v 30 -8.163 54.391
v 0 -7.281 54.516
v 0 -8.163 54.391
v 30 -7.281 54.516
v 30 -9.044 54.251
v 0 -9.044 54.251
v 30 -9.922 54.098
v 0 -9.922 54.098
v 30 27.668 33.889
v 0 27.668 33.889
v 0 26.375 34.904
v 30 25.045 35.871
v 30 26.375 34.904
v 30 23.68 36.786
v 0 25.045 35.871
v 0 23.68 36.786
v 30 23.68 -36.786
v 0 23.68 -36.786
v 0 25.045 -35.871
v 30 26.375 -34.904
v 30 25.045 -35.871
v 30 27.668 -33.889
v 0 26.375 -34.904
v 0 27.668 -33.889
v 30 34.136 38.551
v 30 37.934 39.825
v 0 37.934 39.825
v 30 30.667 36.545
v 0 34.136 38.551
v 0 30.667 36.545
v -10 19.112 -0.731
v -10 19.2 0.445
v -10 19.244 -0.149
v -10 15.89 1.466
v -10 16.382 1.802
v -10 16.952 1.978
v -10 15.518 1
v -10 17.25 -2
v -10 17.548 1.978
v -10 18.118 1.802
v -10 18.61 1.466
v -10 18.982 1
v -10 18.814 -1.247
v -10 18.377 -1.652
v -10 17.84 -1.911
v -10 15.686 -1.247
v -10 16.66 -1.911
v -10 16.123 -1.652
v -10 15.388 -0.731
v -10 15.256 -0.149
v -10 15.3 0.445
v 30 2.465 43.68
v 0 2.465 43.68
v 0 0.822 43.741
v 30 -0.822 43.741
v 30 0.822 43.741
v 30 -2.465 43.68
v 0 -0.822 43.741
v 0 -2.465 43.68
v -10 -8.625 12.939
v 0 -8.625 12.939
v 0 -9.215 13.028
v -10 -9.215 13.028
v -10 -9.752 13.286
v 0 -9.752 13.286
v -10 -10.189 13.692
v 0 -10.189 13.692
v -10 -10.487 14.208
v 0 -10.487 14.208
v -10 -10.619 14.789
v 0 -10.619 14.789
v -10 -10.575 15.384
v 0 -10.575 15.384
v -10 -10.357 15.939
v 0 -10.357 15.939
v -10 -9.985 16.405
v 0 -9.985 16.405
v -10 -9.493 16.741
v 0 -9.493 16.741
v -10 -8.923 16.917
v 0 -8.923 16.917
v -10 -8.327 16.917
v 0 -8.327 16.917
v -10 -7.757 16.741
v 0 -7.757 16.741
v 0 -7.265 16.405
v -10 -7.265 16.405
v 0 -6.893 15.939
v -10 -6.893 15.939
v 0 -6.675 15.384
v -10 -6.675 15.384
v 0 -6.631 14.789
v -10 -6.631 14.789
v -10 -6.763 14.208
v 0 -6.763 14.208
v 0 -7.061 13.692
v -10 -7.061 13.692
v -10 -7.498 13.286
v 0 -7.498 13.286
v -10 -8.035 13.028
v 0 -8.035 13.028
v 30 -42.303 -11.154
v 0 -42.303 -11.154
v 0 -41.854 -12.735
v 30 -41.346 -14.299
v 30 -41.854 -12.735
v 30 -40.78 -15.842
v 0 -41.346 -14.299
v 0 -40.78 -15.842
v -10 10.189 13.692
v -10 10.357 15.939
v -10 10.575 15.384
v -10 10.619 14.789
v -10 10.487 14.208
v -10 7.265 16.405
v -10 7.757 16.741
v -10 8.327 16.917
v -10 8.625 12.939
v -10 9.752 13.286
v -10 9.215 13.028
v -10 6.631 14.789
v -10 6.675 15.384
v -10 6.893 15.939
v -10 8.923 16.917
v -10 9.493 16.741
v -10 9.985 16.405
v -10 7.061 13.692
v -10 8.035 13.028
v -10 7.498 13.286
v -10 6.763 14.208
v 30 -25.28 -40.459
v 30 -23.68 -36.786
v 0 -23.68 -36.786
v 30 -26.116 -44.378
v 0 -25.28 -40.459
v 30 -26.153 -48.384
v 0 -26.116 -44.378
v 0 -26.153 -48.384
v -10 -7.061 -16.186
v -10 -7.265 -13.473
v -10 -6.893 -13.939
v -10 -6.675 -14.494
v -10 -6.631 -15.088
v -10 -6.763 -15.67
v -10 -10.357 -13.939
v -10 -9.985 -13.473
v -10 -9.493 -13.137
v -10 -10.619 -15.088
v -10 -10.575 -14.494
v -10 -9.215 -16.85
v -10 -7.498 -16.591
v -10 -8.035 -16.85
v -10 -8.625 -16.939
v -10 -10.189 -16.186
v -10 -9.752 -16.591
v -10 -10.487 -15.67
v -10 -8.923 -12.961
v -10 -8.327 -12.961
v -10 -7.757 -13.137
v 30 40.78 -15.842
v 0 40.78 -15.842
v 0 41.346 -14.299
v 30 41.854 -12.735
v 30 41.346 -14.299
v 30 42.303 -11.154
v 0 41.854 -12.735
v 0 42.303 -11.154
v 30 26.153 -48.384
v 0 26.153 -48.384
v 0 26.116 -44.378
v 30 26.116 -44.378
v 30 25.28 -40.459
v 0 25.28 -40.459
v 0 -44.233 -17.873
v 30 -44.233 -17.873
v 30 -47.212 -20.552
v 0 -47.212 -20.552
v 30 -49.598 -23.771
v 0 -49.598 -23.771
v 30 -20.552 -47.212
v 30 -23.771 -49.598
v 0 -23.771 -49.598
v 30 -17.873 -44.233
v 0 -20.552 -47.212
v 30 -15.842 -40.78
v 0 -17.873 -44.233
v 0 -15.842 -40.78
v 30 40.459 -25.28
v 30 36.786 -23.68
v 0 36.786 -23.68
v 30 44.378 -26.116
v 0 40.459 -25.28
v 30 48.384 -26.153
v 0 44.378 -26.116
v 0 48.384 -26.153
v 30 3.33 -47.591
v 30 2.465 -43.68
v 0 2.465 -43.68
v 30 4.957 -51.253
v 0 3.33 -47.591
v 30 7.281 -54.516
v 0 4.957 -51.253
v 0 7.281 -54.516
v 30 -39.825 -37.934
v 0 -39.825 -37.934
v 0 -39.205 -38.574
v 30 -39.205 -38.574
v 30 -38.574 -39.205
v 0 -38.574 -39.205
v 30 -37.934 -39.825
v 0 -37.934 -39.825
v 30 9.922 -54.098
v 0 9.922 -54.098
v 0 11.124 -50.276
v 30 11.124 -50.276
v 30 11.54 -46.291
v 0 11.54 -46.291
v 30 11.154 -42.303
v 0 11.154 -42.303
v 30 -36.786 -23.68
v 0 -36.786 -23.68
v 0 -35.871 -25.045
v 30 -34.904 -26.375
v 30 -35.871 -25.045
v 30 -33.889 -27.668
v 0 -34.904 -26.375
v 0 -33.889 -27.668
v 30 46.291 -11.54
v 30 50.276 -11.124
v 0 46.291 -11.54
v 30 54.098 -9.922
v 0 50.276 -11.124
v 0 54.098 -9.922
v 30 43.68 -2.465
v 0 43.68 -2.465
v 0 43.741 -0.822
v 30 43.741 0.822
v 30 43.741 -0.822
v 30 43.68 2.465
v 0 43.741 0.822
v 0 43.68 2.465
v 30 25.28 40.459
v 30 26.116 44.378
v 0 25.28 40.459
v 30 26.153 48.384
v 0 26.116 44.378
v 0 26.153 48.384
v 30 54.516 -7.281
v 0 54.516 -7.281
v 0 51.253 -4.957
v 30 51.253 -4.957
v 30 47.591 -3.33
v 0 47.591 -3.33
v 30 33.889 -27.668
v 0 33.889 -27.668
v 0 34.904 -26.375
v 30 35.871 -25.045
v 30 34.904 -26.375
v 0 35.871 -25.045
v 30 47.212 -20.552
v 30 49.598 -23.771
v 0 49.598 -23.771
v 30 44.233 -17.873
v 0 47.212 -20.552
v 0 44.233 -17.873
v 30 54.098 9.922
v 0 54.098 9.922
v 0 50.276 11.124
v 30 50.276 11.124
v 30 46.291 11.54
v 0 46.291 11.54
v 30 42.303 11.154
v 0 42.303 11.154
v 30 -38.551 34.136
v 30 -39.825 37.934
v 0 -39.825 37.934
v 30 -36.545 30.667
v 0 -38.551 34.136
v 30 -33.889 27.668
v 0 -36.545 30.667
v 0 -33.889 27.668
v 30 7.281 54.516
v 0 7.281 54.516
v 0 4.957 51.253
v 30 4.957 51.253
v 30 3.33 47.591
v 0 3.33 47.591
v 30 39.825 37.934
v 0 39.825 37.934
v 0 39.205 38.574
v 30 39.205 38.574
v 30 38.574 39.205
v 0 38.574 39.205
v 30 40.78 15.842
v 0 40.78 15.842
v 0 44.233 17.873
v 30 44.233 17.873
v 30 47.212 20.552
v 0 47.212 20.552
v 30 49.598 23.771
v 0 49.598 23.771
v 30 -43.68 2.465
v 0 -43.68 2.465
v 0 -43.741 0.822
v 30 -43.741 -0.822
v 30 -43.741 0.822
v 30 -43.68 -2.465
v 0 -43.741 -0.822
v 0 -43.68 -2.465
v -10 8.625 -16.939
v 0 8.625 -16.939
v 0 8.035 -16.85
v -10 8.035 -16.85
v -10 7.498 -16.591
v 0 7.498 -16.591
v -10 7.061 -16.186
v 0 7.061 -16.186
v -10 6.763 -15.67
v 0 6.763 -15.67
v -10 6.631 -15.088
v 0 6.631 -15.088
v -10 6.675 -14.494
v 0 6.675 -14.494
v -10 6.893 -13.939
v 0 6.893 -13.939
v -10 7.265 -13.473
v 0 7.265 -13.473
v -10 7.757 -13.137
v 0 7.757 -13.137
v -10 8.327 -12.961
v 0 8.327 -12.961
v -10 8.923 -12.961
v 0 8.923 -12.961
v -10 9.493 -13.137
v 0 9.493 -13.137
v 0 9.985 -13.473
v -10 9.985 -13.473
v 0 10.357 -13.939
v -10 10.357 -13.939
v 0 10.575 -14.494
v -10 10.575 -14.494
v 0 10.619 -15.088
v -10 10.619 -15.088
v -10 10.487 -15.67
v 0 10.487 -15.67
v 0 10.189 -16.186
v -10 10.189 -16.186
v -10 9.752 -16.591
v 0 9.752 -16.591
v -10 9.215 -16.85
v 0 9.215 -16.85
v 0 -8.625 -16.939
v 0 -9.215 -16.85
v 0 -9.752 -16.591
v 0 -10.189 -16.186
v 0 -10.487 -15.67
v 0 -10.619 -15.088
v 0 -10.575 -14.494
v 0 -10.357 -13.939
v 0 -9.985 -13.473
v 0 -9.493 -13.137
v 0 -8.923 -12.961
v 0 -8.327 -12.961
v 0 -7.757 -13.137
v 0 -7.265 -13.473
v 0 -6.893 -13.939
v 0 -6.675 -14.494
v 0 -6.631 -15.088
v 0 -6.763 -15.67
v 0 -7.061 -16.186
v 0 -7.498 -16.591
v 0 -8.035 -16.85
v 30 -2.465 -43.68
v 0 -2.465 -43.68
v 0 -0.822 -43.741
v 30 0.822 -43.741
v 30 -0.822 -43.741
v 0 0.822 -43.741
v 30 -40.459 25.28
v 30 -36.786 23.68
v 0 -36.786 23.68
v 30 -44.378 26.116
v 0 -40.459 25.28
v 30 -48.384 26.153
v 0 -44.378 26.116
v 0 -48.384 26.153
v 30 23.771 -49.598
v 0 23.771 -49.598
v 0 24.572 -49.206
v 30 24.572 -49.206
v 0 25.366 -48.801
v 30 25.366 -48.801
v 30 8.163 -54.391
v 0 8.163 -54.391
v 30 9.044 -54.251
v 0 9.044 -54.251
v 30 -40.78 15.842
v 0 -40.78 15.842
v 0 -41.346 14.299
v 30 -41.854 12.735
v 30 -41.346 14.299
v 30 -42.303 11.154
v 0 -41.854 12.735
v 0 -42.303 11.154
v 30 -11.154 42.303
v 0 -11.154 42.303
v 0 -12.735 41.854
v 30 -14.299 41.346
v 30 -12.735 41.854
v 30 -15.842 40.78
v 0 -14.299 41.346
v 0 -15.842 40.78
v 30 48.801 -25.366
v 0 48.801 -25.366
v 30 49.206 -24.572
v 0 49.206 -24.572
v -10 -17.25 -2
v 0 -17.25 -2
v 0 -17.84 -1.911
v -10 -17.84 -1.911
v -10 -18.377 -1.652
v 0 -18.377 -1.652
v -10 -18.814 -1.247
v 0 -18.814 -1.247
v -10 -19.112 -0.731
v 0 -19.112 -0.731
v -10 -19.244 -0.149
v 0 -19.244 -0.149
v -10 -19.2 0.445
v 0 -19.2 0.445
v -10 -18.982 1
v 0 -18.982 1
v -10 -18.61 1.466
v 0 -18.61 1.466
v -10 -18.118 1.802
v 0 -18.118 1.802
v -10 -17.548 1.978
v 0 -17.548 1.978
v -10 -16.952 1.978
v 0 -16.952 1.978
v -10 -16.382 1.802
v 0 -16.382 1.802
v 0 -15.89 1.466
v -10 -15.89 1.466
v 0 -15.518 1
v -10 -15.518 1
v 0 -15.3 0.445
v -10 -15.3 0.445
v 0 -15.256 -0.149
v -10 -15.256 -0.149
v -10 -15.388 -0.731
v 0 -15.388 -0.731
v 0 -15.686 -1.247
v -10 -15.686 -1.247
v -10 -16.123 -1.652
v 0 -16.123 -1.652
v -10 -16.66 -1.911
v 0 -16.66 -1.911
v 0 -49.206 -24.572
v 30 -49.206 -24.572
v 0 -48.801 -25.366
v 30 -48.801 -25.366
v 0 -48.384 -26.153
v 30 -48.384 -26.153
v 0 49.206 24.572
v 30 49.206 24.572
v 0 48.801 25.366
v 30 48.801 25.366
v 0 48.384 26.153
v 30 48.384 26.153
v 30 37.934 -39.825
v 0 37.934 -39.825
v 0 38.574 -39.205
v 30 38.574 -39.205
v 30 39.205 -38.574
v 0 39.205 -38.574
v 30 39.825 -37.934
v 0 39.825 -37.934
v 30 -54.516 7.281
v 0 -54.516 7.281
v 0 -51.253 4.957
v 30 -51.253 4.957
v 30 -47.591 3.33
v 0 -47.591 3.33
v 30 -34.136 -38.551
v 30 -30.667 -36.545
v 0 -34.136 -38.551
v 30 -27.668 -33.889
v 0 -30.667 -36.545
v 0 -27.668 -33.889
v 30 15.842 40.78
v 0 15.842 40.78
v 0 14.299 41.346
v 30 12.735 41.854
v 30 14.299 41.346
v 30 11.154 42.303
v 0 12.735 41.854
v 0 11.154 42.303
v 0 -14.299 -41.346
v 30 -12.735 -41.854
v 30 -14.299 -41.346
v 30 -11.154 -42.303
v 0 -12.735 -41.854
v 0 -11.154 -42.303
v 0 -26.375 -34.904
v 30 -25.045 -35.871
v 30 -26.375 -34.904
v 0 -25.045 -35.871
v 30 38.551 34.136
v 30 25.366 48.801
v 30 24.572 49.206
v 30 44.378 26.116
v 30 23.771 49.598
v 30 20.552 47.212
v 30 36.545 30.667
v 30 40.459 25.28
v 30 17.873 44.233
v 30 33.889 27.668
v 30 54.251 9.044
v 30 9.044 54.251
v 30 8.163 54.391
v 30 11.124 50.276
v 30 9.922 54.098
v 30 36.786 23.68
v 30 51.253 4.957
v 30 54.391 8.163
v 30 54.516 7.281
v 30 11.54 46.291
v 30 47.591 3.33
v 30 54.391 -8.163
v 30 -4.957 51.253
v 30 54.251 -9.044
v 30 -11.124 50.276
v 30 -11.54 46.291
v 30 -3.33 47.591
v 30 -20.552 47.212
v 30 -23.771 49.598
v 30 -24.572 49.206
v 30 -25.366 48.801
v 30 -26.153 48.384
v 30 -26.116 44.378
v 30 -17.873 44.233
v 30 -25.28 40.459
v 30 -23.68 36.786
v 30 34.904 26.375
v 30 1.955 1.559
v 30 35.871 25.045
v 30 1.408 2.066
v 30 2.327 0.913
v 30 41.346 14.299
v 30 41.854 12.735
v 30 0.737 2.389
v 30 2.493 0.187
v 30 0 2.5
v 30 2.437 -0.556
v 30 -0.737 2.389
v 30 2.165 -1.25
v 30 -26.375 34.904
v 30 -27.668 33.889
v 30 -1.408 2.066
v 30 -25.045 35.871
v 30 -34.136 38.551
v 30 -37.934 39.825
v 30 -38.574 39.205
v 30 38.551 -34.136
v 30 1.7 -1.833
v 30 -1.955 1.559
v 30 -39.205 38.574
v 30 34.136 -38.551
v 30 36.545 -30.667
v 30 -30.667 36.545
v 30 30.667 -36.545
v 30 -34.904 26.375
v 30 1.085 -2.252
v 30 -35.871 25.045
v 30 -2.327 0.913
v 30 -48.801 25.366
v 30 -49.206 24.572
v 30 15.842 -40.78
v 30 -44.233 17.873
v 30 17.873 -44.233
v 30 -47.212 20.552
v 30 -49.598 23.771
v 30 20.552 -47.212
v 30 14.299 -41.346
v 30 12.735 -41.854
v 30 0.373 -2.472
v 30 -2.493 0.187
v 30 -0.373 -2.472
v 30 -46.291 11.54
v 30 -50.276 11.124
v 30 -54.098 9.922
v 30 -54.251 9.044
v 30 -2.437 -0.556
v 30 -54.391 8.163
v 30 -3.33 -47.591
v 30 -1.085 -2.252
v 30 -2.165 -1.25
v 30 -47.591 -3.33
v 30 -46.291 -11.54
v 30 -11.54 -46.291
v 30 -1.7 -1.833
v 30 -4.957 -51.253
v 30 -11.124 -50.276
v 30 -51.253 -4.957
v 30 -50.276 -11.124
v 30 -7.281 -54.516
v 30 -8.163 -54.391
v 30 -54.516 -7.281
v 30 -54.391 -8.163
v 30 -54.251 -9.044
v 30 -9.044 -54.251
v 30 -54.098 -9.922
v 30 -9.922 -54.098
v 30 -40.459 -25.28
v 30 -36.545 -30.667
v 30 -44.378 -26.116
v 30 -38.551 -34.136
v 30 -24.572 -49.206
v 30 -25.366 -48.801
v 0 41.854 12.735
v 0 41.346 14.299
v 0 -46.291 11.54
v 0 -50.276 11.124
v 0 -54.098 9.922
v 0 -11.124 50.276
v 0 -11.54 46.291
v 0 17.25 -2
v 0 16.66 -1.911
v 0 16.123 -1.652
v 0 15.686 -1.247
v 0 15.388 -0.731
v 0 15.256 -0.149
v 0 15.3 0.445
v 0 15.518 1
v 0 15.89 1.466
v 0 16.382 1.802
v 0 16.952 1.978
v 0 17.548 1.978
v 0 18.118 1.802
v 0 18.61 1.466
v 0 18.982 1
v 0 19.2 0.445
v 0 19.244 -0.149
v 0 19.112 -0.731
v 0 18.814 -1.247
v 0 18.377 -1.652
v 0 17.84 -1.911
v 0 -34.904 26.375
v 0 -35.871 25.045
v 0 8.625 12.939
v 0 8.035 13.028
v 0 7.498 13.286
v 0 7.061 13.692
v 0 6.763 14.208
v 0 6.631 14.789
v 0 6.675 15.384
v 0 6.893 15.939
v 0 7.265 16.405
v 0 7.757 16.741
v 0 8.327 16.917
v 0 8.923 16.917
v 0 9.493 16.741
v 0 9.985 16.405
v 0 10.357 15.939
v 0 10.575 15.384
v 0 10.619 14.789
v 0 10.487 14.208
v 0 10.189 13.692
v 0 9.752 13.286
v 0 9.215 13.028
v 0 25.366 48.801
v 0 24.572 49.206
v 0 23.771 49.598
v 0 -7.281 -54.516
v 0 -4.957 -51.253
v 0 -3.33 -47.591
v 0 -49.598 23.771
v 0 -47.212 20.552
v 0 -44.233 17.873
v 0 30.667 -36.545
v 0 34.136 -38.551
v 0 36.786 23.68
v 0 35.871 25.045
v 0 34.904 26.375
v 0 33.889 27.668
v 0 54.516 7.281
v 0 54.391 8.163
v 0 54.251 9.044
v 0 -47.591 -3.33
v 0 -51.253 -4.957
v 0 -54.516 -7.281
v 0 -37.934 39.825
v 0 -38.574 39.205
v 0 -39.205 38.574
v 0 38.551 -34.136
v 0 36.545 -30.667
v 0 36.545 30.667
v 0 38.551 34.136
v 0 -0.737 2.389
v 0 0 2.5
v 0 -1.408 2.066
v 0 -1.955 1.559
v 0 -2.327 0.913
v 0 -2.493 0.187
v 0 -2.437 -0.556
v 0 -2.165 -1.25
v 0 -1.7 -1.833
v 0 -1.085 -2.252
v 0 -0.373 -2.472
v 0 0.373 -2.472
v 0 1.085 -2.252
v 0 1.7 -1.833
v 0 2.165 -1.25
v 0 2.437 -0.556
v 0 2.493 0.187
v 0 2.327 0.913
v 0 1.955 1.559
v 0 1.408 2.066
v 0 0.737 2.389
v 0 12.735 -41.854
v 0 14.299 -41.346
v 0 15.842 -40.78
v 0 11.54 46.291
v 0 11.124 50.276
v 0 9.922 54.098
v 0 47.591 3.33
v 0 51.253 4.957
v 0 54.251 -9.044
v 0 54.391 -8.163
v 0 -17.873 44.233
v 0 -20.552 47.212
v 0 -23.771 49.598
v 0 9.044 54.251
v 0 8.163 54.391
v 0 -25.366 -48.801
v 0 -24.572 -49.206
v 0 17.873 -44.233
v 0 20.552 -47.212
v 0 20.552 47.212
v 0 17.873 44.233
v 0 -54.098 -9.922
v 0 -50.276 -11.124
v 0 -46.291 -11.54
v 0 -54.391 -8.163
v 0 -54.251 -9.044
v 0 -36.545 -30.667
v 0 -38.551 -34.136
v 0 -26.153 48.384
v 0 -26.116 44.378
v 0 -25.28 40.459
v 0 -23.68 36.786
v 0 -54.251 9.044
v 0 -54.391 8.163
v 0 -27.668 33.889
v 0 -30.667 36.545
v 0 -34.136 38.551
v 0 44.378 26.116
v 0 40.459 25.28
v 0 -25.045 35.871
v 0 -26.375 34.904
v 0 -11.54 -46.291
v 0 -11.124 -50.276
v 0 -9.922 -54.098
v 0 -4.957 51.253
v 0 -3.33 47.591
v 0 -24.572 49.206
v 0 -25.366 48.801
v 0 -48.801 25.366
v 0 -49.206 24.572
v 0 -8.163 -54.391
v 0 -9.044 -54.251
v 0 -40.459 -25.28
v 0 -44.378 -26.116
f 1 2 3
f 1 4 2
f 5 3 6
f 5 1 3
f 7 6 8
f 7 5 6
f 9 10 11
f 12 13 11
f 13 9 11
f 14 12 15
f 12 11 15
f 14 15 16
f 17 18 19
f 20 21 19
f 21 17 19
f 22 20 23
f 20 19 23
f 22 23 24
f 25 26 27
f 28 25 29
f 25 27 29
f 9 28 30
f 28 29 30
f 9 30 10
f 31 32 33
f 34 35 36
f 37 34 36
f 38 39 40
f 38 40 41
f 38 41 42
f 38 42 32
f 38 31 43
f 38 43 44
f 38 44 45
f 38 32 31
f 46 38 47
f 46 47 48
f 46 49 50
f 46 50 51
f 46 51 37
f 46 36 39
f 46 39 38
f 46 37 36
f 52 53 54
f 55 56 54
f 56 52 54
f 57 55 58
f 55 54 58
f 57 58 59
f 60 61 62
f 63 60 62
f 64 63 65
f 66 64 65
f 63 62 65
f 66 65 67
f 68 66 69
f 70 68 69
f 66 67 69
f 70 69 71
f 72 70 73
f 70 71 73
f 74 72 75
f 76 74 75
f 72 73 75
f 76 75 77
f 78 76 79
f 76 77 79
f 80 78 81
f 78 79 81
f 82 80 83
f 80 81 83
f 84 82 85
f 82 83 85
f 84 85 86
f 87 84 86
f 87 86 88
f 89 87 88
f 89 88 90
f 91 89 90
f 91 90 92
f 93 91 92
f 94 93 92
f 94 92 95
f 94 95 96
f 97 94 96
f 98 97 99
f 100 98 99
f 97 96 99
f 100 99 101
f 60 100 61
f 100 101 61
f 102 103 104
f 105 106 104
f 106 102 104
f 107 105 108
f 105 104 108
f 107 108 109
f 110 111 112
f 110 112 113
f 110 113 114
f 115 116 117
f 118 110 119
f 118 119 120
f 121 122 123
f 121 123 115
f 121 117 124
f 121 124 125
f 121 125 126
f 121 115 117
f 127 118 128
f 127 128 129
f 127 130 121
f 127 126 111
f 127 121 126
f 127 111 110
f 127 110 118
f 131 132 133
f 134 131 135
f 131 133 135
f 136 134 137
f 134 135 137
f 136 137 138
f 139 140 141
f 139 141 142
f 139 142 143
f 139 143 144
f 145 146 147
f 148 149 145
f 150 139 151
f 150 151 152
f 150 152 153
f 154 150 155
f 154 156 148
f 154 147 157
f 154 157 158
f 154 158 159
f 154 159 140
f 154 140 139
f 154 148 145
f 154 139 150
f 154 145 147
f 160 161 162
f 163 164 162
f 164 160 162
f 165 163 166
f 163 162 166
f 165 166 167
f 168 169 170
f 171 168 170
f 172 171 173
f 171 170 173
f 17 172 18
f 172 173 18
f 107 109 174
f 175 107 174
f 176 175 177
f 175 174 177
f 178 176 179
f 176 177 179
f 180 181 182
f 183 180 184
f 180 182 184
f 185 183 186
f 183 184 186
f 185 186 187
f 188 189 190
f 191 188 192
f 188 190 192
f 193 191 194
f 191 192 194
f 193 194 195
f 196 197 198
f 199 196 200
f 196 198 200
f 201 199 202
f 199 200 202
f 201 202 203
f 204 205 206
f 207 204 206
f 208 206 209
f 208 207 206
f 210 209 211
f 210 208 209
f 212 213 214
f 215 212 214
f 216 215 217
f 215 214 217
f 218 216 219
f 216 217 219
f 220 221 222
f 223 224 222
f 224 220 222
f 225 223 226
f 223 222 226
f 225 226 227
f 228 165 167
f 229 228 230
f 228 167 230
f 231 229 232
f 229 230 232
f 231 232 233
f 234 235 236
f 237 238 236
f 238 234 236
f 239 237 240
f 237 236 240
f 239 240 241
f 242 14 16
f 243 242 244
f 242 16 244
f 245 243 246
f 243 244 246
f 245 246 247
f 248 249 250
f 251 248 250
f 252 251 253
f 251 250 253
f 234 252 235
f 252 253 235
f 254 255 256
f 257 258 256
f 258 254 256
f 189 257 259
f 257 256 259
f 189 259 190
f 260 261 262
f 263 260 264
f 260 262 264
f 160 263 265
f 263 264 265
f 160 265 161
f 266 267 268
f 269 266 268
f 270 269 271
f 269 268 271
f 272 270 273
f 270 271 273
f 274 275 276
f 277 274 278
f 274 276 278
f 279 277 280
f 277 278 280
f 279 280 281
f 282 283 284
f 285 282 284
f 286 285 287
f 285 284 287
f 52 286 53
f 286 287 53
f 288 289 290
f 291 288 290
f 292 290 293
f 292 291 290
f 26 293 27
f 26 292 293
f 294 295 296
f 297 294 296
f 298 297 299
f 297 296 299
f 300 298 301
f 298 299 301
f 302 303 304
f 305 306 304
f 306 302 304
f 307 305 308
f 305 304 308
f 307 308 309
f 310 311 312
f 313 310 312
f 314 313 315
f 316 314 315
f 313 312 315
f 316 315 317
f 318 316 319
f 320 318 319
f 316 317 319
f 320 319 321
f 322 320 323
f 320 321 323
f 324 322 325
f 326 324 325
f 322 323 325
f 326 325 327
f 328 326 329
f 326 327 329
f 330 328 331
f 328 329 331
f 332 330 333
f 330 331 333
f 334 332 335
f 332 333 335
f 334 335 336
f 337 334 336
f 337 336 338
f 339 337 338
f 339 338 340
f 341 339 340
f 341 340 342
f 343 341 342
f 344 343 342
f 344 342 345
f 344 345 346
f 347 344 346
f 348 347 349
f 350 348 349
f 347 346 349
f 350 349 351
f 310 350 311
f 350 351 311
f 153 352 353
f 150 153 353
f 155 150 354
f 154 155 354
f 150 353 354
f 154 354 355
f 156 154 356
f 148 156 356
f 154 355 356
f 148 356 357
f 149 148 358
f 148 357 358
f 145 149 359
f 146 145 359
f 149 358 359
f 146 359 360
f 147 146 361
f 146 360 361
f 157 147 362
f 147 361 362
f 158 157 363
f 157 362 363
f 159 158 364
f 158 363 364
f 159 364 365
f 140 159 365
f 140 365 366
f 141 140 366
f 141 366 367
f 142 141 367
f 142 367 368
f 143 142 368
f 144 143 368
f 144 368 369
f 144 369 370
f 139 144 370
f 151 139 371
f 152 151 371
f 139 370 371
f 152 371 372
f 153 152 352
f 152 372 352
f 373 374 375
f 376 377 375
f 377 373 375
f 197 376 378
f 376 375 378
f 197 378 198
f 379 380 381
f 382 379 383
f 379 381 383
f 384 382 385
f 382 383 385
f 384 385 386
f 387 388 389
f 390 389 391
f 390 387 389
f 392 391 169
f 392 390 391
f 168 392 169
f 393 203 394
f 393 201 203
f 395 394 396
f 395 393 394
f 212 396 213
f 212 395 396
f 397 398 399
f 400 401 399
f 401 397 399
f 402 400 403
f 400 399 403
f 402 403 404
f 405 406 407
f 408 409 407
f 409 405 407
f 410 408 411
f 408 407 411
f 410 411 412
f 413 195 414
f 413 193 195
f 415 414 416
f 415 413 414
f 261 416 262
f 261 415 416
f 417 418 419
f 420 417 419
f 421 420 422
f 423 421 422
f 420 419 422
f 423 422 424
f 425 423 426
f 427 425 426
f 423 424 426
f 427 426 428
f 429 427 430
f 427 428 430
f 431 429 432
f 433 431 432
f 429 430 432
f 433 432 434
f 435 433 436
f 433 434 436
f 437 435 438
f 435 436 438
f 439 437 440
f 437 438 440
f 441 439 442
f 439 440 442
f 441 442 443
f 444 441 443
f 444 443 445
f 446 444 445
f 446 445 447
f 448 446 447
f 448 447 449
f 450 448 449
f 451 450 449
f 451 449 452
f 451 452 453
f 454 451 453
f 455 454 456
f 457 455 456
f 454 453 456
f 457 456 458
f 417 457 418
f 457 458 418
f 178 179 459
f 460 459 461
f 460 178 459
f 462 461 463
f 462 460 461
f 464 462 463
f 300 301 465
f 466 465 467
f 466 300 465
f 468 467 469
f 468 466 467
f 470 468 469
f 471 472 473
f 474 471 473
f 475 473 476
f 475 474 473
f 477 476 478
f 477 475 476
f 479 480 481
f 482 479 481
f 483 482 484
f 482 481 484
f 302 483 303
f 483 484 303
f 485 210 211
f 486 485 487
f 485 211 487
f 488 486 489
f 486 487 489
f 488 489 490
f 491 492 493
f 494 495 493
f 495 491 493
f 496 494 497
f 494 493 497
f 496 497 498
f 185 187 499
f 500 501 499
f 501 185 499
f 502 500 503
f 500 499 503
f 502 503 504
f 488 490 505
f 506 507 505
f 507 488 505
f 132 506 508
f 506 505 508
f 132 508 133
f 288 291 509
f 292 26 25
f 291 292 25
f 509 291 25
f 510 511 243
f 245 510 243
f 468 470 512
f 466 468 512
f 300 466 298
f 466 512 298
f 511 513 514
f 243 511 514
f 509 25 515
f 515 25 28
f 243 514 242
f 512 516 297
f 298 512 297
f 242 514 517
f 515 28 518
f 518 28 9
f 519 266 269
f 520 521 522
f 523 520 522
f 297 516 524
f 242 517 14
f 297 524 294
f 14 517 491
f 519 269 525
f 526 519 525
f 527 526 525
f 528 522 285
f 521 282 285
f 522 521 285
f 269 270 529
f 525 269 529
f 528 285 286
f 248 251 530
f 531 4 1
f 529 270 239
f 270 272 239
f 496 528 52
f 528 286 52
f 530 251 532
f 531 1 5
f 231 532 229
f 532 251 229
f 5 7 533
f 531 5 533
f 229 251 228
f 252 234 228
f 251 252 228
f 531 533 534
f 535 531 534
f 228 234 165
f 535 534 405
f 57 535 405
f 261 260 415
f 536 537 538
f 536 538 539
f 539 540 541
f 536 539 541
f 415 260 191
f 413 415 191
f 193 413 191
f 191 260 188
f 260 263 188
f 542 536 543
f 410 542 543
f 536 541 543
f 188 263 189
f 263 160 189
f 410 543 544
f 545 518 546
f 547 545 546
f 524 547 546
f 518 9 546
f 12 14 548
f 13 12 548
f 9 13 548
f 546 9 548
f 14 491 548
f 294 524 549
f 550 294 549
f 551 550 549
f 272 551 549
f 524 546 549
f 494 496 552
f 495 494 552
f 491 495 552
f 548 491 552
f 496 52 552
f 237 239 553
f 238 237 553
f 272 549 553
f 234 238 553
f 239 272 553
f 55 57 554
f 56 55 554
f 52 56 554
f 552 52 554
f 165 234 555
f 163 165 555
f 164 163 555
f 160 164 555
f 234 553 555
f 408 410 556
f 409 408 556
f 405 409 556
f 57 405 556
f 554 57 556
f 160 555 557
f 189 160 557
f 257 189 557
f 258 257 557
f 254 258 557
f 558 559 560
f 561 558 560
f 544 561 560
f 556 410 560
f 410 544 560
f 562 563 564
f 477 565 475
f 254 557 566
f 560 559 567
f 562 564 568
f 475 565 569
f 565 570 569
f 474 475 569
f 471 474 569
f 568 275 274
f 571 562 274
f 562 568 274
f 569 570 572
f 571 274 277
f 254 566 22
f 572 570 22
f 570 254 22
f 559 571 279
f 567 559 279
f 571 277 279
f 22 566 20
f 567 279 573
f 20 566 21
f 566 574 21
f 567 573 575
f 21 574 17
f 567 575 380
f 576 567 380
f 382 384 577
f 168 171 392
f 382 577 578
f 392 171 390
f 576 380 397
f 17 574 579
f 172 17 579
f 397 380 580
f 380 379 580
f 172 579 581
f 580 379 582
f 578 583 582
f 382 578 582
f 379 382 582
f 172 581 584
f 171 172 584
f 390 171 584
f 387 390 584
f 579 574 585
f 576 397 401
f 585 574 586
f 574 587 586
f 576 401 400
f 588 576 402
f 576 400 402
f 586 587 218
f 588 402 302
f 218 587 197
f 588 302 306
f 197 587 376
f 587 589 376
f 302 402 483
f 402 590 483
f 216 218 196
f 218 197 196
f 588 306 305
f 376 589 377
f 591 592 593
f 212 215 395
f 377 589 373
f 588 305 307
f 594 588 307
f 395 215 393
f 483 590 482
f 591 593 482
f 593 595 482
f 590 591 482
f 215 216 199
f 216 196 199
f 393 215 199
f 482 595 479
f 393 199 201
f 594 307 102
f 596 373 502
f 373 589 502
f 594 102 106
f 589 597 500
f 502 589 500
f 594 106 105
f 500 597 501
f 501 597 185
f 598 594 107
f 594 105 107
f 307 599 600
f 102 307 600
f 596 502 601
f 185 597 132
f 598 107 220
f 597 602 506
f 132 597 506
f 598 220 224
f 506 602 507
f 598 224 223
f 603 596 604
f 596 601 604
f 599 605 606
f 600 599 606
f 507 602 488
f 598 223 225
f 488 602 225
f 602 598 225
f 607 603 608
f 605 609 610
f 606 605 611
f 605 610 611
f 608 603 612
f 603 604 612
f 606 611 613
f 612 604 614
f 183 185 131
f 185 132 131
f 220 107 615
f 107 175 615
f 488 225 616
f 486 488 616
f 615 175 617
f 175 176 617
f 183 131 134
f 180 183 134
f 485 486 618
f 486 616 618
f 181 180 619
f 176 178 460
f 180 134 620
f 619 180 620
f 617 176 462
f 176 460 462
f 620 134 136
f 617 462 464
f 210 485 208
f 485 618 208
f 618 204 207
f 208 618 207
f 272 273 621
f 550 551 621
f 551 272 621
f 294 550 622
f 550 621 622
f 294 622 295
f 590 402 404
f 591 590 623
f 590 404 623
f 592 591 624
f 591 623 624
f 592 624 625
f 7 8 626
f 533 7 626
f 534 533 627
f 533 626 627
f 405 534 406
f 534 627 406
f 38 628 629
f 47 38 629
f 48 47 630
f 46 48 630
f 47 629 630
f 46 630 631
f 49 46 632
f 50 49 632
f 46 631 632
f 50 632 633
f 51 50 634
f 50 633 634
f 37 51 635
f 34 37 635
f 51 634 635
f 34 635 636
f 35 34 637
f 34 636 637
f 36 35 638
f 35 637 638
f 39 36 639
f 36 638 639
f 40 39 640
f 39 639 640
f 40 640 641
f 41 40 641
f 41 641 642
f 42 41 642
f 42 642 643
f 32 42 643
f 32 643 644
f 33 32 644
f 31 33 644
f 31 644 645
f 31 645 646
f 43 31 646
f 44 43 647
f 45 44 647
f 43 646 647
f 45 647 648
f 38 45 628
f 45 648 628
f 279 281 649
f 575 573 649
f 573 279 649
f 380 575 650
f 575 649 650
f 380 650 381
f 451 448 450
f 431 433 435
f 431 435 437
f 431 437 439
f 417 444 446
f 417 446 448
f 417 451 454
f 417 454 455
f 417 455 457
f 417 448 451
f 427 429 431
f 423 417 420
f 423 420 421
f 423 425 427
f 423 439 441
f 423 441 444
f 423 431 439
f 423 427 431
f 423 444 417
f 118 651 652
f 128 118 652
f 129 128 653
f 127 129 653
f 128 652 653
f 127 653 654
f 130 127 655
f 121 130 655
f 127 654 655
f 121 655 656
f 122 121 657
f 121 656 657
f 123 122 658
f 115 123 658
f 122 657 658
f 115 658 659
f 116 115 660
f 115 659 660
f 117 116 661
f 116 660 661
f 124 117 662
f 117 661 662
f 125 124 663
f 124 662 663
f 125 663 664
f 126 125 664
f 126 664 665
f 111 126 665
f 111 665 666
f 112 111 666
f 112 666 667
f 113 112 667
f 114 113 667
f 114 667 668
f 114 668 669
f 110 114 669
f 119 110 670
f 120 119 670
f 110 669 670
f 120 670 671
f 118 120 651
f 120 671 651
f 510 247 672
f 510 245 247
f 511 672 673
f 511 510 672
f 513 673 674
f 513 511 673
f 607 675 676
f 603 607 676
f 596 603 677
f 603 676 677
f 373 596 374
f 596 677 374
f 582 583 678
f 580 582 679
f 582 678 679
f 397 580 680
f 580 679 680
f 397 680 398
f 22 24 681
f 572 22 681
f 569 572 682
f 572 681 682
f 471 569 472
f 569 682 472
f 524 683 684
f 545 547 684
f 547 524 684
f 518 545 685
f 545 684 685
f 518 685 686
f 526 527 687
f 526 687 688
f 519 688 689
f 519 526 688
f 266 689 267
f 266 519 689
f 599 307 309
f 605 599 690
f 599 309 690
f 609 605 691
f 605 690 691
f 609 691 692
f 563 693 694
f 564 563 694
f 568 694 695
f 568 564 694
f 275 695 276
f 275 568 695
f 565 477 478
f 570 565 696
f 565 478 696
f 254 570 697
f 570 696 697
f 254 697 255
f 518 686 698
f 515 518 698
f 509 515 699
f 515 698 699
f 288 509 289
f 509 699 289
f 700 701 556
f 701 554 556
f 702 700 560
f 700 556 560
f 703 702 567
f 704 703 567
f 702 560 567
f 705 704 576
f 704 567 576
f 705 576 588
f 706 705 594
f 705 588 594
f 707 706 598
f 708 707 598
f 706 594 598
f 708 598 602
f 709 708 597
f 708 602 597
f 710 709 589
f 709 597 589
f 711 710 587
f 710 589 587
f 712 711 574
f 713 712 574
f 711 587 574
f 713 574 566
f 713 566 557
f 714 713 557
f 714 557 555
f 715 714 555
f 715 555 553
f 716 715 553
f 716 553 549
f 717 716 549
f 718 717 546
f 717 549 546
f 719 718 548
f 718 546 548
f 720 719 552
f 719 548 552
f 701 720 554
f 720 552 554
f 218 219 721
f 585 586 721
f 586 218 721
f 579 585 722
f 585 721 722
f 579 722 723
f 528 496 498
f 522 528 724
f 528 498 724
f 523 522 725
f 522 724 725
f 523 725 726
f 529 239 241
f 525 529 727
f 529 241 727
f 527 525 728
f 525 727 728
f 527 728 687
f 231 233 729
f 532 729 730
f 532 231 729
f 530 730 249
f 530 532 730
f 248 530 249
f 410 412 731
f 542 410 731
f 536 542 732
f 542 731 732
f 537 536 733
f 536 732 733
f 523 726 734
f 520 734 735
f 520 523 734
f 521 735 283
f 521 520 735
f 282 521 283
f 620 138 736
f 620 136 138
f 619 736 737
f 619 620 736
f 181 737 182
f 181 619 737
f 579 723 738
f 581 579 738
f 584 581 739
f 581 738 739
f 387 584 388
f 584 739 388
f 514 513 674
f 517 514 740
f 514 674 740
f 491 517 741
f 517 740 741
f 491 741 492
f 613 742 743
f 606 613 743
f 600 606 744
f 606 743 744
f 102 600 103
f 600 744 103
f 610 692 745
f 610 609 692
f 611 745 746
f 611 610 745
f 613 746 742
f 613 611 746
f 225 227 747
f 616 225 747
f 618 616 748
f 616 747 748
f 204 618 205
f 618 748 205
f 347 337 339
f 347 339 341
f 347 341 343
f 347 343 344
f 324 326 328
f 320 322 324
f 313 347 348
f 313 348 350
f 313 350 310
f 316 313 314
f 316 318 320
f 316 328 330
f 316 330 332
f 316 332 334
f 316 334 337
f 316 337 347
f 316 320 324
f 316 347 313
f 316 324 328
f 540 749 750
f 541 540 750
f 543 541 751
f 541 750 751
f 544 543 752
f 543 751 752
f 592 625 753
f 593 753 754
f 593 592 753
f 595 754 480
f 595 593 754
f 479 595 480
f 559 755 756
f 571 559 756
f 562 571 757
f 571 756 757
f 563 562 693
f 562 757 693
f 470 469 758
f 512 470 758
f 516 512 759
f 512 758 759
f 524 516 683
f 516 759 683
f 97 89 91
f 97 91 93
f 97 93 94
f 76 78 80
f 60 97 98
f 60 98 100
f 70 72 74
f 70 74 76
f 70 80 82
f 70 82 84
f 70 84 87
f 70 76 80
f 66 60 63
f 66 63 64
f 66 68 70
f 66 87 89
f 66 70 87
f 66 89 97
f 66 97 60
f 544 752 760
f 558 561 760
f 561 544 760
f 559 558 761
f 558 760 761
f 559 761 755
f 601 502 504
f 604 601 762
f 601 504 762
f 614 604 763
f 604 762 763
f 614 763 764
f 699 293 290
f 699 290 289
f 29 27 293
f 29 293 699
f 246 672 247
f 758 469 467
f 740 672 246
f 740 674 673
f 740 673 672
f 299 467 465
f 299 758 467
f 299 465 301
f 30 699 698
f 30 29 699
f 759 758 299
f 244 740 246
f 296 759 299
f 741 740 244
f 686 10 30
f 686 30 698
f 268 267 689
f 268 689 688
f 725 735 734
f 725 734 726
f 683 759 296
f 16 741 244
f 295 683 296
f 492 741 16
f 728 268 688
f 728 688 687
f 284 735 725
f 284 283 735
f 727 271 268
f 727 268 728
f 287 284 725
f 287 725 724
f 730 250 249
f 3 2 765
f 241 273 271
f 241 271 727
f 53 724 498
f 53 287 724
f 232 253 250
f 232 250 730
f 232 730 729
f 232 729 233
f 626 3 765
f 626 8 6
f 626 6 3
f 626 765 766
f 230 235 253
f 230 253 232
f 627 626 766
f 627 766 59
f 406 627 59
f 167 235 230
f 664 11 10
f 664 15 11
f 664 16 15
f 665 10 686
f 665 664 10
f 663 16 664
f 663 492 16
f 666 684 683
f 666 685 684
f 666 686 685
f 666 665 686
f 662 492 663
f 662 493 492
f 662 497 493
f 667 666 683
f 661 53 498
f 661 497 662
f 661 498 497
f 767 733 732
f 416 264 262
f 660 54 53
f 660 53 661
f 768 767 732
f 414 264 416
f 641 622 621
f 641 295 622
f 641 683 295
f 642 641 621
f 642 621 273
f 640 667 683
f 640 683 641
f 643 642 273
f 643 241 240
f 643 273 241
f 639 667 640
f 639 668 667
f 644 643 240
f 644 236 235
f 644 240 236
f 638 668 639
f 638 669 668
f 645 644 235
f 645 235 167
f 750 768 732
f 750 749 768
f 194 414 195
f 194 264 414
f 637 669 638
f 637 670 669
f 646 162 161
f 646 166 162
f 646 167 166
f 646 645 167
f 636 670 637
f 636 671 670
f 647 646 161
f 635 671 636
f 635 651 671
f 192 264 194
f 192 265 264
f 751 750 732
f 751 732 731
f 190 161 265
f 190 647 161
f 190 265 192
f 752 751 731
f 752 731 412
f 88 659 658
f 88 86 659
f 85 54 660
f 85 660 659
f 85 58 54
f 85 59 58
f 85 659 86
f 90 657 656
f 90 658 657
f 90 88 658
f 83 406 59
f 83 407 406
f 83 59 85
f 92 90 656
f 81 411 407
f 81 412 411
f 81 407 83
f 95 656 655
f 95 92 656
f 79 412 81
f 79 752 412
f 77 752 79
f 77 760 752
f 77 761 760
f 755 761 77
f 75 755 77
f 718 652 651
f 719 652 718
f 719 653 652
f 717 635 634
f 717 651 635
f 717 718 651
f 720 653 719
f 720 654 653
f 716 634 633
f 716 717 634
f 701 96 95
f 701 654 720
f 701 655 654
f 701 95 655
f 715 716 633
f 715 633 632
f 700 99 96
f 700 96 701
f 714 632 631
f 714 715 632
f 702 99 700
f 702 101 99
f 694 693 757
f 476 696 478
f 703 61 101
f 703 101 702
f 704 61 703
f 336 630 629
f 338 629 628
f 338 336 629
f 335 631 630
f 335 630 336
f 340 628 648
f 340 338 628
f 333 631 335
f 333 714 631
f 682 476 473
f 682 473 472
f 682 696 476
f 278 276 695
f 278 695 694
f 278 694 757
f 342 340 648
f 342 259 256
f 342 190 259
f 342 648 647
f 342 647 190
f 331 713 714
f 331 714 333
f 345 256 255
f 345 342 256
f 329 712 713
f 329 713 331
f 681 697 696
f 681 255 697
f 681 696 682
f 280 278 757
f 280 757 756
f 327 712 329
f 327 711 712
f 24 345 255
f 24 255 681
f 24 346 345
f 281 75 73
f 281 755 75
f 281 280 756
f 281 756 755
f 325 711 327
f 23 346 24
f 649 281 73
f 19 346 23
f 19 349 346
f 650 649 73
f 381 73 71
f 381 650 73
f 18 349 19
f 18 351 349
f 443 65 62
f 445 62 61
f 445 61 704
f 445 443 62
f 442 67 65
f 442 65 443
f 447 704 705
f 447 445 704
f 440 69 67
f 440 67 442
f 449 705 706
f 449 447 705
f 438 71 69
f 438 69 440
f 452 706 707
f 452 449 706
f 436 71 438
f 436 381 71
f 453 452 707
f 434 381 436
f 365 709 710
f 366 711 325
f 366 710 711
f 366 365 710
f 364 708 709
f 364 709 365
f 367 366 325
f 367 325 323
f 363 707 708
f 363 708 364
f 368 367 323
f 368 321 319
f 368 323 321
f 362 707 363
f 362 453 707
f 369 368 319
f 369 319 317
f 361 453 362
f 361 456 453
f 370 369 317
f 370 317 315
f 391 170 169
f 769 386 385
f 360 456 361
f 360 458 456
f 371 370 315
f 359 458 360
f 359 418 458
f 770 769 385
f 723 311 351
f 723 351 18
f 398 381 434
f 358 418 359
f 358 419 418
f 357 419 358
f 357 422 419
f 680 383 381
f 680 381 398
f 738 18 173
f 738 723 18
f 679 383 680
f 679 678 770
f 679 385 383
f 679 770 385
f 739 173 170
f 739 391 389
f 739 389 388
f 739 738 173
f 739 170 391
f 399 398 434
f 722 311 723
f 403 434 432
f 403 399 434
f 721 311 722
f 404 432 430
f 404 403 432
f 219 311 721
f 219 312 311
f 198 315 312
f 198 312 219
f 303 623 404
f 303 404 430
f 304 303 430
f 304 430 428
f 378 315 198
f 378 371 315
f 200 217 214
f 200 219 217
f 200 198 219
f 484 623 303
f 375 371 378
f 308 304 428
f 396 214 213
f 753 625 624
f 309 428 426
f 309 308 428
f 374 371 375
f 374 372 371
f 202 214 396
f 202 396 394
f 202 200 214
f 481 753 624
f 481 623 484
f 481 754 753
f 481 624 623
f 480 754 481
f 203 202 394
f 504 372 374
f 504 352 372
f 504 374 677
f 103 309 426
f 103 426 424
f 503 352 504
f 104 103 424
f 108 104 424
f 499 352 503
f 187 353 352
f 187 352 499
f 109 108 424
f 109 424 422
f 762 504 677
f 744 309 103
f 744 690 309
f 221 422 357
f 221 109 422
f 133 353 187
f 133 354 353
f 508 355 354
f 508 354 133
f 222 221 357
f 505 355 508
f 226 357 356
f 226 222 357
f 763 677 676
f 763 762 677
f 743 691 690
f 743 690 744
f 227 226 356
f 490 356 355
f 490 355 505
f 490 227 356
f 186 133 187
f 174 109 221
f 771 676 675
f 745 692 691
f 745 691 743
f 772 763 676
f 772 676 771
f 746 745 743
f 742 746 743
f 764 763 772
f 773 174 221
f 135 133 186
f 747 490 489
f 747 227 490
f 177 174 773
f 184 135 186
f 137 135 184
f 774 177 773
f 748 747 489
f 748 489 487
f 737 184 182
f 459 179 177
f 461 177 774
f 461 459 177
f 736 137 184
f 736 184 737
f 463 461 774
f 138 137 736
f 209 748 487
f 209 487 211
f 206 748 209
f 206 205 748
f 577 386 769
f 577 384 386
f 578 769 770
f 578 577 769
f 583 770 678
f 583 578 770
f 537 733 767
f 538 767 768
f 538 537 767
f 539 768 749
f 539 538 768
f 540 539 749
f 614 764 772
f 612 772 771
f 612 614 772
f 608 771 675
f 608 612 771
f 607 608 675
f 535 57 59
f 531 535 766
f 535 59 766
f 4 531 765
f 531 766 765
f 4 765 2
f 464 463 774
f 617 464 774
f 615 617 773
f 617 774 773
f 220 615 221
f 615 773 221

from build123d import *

# Parameters (mm, degrees)
BASPROSKE_W     = 30
BASPROSKE_H     = 55
TOOTHCUT_DEPTH  = 84.366660003
TEETHCUTS_COUNT = 20
TEETHCUTS_ANGLE = 342
BORSKE_R        = 2.5
BORE_DEPTH      = 50.0000508
SKETCH_1_R      = 2
EXTRUDE_1_DEPTH = 10


with BuildPart() as part:
    # BasProSke → Base-Revolve (revolve)
    with BuildSketch(Plane(origin=(0, 0, 0), x_dir=(1, 0, 0), z_dir=(0, 1, 0)), mode=Mode.PRIVATE) as base_revolve_sk:
        with Locations((15, 27.5)):
            Rectangle(BASPROSKE_W, BASPROSKE_H)
    revolve(base_revolve_sk.sketch.rotate(Axis((-10, 0, 0), (1, 0, 0)), 180), axis=Axis((-10, 0, 0), (1, 0, 0)))

    # TooCutSke → ToothCut (cut, through all)
    with BuildSketch(Plane(origin=(0, 0, 0), x_dir=(0, 0, -1), z_dir=(1, 0, 0))):
        with BuildLine():
            ThreePointArc((2.464838288, 43.679509764), (0, 43.749), (-2.464838288, 43.679509764))
            ThreePointArc((-2.464838288, 43.679509764), (-4.057398861, 49.476814676), (-7.300899231, 54.538899105))
            ThreePointArc((-7.300899231, 54.538899105), (0, 55.0254), (7.300899231, 54.538899105))
            ThreePointArc((7.300899231, 54.538899105), (4.057398861, 49.476814676), (2.464838288, 43.679509764))
        make_face()
    toothcut = extrude(amount=TOOTHCUT_DEPTH, mode=Mode.SUBTRACT)

    # TeethCuts: ToothCut ×20 about axis
    teethcuts_axis = Axis((-10, 0, 0), (1, 0, 0))
    for i in range(1, TEETHCUTS_COUNT):
        add(toothcut.rotate(teethcuts_axis, i * TEETHCUTS_ANGLE / (TEETHCUTS_COUNT - 1)), mode=Mode.SUBTRACT)

    # BorSke → Bore (cut, symmetric)
    with BuildSketch(Plane(origin=(0, 0, 0), x_dir=(0, 0, -1), z_dir=(1, 0, 0))):
        with Locations(Location((0, 0, 0), (0, 0, 180))):
            Circle(BORSKE_R)
    extrude(amount=BORE_DEPTH, both=True, mode=Mode.SUBTRACT)

    # 草图1 → 凸台-拉伸1 (add)
    with BuildSketch(Plane.ZY):
        with Locations(Location((0, -17.25, 0), (0, 0, 180))):
            Circle(SKETCH_1_R)
        with Locations(Location((-14.938938215, -8.625, 0), (0, 0, 180))):
            Circle(SKETCH_1_R)
        with Locations(Location((-14.938938215, 8.625, 0), (0, 0, 180))):
            Circle(SKETCH_1_R)
        with Locations(Location((0, 17.25, 0), (0, 0, 180))):
            Circle(SKETCH_1_R)
        with Locations(Location((14.938938215, 8.625, 0), (0, 0, 180))):
            Circle(SKETCH_1_R)
        with Locations(Location((14.938938215, -8.625, 0), (0, 0, 180))):
            Circle(SKETCH_1_R)
    extrude(amount=EXTRUDE_1_DEPTH)


solid = part.part
